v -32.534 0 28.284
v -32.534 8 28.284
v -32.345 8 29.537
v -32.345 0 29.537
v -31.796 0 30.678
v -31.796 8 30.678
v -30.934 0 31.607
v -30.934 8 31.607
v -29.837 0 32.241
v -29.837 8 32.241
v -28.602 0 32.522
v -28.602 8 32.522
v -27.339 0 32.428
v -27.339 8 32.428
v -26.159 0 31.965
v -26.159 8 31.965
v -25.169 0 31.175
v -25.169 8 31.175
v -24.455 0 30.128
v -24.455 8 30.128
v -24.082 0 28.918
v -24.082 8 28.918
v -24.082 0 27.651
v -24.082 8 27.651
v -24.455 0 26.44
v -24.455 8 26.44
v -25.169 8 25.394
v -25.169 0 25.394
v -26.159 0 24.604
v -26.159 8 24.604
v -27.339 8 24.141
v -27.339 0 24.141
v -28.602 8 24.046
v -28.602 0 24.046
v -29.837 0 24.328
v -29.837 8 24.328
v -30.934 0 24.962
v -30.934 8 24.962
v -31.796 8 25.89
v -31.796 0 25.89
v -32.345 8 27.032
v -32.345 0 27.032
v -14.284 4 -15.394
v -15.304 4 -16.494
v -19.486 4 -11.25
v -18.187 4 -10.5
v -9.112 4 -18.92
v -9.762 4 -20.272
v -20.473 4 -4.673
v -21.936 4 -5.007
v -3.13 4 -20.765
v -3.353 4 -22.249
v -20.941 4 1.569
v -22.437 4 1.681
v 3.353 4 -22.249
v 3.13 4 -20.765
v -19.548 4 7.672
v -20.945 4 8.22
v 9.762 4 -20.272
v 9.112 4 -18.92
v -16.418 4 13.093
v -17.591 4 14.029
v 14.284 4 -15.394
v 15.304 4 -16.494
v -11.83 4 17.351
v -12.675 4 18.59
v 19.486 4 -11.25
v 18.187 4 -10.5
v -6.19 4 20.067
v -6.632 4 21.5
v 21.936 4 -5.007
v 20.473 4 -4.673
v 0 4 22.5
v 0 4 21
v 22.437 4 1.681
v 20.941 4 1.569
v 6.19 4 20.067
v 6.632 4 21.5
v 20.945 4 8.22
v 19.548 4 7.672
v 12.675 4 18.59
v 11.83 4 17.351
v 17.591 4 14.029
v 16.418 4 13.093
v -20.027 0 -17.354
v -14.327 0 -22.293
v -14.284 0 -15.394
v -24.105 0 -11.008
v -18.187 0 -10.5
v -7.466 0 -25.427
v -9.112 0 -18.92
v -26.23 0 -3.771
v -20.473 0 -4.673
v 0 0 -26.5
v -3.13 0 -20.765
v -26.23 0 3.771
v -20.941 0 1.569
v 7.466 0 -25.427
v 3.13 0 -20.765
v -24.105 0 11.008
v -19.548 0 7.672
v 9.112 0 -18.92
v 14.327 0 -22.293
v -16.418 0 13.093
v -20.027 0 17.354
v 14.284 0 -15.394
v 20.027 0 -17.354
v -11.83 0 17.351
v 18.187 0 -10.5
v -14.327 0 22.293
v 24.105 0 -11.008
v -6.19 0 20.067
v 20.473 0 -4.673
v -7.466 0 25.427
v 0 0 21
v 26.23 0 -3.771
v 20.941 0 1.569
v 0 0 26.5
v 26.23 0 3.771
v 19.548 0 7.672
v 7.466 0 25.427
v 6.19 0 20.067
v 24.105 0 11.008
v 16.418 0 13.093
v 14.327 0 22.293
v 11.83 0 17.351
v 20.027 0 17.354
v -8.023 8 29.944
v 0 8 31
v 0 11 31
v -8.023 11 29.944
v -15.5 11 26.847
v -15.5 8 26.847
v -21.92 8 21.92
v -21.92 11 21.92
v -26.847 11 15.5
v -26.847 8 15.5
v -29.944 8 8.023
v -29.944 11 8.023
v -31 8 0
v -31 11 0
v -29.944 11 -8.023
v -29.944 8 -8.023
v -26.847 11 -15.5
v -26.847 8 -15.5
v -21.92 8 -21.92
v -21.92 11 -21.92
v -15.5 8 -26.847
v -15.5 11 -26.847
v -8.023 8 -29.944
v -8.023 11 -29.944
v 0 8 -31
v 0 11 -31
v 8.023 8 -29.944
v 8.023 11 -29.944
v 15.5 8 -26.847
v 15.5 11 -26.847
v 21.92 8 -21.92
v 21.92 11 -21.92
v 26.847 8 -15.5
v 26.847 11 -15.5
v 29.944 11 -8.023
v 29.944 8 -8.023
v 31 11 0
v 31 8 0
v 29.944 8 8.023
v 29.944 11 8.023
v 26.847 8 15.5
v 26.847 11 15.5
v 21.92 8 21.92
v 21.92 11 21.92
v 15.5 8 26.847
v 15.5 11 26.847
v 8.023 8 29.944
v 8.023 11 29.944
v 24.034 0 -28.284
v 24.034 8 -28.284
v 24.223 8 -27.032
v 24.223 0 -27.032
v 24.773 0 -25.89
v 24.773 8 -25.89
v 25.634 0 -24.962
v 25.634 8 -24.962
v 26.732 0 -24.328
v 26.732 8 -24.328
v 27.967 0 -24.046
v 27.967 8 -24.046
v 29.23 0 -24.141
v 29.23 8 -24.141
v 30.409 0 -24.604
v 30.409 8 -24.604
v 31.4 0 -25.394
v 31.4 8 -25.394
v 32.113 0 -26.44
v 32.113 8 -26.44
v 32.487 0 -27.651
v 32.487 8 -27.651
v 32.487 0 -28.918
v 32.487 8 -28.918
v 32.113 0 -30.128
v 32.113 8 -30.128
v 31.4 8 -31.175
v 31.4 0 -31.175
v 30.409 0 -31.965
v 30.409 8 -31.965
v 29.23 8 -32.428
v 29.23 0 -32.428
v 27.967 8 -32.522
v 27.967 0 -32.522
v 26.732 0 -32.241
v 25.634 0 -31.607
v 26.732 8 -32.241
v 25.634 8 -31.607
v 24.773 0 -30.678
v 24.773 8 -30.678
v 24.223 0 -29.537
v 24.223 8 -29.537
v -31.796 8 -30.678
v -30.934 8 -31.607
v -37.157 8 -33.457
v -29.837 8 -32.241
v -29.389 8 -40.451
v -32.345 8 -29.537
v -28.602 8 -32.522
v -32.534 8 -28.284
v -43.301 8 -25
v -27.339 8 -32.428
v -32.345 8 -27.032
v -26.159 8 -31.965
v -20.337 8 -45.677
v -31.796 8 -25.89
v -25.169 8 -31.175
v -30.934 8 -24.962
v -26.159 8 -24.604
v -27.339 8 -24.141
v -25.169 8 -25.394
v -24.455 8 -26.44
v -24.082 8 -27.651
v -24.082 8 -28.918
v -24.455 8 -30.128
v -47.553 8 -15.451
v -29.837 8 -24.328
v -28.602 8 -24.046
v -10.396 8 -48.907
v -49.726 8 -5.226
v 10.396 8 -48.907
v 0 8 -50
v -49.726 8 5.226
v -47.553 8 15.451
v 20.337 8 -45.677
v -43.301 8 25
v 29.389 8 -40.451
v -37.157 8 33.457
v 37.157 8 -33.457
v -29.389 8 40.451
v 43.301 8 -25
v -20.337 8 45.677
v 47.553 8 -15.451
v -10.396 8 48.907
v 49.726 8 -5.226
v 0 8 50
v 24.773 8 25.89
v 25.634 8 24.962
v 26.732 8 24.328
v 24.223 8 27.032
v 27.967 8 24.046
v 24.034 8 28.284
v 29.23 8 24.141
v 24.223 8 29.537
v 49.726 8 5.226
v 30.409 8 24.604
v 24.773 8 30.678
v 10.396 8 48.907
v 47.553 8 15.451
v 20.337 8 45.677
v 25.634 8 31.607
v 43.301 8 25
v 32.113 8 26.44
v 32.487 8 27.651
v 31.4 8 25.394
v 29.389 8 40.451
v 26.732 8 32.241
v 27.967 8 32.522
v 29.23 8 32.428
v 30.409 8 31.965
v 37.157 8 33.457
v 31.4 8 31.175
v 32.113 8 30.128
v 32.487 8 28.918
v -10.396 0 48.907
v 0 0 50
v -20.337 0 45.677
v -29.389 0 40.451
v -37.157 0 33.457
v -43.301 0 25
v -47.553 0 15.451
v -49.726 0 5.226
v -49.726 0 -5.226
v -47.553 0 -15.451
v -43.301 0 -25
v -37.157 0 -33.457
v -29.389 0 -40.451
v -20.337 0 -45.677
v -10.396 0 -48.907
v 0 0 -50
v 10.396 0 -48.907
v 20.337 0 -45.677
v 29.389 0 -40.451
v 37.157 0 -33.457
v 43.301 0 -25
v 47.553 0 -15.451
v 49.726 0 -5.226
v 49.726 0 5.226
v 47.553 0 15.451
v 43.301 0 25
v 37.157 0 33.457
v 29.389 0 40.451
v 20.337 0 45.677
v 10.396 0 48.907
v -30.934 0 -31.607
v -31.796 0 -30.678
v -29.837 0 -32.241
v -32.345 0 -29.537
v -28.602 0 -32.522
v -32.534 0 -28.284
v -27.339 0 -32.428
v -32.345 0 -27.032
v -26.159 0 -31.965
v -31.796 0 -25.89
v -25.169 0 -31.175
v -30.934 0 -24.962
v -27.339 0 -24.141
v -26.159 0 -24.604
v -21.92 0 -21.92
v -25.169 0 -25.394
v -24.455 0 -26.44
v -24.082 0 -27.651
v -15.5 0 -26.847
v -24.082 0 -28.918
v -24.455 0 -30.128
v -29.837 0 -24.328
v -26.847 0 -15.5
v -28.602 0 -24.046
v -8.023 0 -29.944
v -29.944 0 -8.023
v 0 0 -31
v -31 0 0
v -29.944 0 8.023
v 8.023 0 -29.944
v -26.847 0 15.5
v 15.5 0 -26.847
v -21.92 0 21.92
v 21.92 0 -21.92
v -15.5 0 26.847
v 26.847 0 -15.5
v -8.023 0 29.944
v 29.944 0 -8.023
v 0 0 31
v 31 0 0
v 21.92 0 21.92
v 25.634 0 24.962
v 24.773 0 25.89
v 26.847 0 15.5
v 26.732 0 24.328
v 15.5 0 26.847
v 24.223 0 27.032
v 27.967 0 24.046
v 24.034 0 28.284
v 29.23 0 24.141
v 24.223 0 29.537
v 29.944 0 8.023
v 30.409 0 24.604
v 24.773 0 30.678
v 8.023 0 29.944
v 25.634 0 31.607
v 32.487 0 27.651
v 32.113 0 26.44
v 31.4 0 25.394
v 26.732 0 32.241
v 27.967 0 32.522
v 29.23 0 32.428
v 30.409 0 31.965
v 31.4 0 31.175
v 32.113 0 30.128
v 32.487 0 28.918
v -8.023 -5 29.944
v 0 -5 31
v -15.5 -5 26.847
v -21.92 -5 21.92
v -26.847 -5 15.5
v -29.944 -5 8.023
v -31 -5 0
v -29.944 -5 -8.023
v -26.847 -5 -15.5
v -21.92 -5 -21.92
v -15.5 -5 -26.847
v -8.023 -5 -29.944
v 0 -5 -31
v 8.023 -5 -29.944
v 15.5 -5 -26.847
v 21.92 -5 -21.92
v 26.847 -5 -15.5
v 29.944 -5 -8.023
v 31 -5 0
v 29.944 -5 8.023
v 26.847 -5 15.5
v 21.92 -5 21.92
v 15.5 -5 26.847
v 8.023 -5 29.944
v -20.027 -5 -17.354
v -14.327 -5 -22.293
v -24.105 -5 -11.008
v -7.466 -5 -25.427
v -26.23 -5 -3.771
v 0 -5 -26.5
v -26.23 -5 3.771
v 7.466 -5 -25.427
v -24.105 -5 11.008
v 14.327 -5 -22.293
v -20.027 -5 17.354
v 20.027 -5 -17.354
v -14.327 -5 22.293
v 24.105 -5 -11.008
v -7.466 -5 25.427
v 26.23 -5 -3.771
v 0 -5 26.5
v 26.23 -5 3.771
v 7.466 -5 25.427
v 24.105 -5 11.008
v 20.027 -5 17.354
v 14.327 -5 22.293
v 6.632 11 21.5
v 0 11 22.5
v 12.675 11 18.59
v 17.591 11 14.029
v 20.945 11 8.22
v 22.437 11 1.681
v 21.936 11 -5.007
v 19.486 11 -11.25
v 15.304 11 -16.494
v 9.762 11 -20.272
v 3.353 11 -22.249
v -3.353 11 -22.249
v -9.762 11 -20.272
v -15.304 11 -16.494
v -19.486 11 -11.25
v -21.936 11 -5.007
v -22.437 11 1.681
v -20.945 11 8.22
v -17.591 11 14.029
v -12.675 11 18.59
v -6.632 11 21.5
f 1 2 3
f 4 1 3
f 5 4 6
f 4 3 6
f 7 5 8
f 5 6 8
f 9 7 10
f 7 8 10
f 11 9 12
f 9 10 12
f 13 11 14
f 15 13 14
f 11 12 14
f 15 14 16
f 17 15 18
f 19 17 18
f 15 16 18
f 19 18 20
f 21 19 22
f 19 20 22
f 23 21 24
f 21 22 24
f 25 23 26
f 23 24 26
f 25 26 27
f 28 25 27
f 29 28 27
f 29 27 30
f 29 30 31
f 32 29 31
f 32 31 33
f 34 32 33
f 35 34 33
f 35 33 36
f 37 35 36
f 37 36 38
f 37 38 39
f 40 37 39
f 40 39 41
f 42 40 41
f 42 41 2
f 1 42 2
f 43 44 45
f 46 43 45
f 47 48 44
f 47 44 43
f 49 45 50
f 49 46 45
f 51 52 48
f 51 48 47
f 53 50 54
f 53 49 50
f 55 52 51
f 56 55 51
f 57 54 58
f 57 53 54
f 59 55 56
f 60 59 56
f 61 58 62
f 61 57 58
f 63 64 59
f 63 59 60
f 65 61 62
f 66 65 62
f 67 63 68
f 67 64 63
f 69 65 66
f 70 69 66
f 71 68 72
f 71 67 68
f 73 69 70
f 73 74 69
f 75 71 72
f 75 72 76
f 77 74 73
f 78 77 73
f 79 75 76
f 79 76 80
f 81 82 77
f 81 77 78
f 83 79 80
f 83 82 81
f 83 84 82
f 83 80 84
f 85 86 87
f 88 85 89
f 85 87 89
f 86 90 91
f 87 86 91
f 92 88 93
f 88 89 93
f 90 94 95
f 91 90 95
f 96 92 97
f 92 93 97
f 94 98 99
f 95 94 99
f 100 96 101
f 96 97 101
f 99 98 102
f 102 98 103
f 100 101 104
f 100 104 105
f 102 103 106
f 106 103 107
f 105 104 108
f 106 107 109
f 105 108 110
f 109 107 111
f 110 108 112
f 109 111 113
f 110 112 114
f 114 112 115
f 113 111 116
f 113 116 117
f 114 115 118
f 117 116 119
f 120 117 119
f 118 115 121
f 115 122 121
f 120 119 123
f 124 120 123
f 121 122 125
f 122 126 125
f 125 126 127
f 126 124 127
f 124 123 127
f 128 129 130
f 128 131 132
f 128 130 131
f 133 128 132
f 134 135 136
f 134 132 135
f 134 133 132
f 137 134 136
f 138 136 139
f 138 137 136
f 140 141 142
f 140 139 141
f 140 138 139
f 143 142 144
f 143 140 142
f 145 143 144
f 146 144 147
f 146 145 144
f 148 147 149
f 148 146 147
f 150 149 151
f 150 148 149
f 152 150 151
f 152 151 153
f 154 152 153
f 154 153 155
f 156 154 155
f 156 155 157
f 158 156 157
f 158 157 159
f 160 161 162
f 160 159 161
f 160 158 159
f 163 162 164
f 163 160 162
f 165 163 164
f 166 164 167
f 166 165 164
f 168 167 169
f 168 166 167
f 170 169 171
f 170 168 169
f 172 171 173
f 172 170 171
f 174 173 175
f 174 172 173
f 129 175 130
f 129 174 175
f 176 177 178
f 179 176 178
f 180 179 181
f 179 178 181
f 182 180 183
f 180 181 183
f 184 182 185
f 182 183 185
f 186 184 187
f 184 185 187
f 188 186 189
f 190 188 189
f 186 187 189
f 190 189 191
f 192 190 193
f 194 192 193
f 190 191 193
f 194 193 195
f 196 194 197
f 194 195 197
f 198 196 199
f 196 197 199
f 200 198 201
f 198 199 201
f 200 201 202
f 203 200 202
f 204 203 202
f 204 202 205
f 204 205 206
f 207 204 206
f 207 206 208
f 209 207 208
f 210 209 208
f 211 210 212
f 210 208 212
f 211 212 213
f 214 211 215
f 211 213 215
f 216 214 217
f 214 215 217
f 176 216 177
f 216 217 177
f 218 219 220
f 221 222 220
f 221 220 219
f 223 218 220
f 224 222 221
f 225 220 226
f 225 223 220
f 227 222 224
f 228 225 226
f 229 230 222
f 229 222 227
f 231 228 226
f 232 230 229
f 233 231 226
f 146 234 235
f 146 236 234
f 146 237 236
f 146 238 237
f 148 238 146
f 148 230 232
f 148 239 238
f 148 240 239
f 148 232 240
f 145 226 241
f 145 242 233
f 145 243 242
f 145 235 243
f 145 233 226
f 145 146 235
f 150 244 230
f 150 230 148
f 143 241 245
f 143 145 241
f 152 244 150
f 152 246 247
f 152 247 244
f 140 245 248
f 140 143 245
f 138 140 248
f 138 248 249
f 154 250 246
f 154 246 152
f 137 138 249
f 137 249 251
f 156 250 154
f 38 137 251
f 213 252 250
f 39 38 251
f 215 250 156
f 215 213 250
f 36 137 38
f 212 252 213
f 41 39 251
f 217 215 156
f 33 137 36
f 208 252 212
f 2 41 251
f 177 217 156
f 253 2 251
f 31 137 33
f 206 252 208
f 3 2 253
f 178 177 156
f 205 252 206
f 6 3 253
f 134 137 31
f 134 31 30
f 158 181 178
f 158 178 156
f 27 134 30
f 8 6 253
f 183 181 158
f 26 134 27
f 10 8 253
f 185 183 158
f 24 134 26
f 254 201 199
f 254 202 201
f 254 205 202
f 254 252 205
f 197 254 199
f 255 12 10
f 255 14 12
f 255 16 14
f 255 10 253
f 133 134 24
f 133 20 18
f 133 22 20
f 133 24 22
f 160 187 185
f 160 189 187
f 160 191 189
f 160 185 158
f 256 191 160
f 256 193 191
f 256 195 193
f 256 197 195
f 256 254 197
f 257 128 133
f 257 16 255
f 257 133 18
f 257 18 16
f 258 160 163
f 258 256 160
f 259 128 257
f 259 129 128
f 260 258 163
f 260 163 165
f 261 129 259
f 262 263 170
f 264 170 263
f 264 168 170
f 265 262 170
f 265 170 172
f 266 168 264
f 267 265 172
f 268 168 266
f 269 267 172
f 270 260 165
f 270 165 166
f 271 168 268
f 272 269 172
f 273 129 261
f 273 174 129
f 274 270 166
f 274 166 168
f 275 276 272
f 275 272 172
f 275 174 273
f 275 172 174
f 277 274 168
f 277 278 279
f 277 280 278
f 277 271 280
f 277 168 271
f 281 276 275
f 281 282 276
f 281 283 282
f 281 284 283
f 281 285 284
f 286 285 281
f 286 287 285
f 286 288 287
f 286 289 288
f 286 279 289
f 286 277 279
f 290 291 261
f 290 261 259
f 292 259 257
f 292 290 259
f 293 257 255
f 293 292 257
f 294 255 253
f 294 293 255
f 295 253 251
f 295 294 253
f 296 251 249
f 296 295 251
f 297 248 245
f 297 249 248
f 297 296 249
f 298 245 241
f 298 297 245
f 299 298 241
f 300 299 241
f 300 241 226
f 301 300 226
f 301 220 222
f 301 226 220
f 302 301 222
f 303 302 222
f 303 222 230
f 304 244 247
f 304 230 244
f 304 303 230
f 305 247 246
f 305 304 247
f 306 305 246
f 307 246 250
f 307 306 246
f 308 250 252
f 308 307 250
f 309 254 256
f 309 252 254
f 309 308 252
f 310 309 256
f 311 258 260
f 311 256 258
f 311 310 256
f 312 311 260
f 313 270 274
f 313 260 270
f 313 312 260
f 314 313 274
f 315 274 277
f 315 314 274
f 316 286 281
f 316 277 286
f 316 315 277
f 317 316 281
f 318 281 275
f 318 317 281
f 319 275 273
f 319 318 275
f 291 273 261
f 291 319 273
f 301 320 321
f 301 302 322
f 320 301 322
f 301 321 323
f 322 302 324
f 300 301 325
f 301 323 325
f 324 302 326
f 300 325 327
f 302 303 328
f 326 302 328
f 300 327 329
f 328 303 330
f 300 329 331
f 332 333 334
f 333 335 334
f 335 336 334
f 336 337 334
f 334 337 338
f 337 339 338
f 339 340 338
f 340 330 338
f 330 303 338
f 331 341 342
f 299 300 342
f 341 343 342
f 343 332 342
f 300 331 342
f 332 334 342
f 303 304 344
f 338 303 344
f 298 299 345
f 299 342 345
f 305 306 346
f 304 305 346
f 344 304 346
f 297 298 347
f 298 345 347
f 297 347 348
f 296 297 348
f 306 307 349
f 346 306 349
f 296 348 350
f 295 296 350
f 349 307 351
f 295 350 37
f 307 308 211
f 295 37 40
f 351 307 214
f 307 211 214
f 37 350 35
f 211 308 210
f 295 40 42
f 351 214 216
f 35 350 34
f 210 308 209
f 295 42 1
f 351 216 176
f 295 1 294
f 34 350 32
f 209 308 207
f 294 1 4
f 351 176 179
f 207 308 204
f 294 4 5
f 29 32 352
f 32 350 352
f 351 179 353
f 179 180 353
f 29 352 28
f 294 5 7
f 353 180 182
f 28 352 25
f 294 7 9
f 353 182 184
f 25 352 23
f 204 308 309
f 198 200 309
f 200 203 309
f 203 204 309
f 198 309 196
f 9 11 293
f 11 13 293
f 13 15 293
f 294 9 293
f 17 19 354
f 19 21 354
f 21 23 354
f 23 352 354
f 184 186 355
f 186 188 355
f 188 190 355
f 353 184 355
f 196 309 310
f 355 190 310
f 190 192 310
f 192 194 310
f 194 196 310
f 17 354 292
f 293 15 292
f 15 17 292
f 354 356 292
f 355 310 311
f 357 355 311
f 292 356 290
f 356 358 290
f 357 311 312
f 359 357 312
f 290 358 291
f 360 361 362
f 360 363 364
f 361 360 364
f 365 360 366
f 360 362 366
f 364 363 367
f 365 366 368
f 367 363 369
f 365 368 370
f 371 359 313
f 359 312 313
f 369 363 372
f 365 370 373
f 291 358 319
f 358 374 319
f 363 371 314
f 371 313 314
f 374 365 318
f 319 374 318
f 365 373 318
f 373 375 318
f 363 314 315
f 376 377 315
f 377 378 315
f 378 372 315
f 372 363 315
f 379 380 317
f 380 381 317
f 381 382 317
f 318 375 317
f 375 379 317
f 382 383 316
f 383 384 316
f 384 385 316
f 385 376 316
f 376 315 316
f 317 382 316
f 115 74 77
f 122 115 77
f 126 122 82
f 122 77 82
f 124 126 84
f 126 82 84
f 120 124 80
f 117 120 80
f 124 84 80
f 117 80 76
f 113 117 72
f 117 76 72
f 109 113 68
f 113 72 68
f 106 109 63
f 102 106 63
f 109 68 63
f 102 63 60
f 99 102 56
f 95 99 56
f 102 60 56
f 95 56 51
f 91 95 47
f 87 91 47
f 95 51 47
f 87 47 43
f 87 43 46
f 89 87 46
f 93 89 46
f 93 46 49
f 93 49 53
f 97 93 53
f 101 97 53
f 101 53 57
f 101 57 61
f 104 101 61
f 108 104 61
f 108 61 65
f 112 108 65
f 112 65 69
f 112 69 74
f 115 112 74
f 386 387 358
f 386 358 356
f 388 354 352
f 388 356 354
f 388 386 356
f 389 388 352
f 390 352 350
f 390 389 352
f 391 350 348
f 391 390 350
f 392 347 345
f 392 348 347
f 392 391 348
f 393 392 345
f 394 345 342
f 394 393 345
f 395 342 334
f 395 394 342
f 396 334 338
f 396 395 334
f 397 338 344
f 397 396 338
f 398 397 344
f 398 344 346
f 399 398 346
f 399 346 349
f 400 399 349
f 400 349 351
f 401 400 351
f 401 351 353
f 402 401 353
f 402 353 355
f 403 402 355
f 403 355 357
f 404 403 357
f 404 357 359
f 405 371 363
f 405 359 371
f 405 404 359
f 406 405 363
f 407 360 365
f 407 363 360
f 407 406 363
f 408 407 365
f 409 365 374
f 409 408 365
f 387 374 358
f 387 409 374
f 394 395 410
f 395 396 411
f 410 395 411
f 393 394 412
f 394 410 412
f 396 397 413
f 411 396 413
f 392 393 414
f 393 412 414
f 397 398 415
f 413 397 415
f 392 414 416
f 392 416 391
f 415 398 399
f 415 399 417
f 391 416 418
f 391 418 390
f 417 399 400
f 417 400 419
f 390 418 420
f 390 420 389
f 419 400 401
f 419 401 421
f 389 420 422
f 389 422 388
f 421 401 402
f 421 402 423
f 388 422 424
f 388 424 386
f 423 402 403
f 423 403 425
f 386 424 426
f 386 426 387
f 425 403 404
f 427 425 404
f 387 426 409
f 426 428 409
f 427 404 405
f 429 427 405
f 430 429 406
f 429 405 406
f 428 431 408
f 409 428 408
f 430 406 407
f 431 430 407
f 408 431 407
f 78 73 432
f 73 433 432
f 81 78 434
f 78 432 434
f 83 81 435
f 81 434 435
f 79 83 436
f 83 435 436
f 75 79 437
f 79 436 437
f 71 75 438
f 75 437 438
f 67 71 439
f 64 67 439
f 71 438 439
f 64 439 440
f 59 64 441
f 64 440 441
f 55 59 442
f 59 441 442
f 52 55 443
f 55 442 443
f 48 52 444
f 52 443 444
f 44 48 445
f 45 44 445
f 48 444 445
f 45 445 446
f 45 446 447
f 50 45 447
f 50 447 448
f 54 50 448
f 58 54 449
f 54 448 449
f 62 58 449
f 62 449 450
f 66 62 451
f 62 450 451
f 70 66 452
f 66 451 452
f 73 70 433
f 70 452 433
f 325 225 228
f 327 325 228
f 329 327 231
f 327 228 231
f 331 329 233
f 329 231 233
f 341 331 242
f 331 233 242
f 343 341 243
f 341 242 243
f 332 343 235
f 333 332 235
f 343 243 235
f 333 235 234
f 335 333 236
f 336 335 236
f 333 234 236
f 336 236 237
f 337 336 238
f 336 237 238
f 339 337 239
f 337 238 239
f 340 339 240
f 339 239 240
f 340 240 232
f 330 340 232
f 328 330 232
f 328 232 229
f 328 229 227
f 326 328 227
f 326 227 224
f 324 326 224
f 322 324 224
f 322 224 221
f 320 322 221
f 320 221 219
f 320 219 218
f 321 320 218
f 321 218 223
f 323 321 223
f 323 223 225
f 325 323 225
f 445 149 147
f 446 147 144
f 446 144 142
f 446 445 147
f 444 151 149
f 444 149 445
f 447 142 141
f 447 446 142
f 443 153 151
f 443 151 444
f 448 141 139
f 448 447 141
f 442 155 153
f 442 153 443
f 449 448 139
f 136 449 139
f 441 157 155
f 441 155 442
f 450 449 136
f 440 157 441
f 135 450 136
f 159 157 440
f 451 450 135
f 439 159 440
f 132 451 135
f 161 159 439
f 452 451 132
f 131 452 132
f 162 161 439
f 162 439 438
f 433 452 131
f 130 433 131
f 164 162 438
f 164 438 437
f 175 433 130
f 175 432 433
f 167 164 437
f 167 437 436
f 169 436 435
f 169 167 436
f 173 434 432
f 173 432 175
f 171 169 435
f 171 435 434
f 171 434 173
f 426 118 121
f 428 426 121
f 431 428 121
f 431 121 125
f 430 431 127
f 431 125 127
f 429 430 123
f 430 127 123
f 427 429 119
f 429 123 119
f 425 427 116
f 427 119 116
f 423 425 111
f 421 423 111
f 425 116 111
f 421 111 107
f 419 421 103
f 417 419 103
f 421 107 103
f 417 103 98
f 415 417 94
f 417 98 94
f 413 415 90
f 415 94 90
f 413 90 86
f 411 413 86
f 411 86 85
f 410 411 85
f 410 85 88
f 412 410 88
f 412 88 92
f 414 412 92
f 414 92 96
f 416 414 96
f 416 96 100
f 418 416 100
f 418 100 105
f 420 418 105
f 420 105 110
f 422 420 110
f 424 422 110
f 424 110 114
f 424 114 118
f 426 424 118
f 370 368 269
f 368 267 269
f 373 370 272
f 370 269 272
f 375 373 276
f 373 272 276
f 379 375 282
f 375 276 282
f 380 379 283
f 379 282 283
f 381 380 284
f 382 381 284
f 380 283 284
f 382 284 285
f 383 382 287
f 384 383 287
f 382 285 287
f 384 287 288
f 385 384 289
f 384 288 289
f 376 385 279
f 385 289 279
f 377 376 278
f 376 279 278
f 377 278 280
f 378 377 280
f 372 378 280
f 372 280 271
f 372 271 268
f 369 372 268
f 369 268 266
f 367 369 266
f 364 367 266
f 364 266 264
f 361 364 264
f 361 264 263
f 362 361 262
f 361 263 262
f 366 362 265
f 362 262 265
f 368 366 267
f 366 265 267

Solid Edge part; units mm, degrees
sketch "Sketch1" plane through (0, 0, 0) normal (1, 0, 0) x (0, 1, 0)
  line L0 (0, 50) -> (0, 31)
  line L1 (0, 31) -> (-5, 31)
  line L2 (-5, 31) -> (-5, 26.5)
  line L3 (-5, 26.5) -> (0, 26.5)
  line L4 (0, 26.5) -> (0, 21)
  line L5 (0, 21) -> (4, 21)
  line L6 (4, 21) -> (4, 22.5)
  line L7 (4, 22.5) -> (11, 22.5)
  line L8 (11, 22.5) -> (11, 31)
  line L9 (11, 31) -> (8, 31)
  line L10 (8, 32.5) -> (8, 31)
  line L11 (8, 39) -> (8, 32.5)
  line L12 (8, 39) -> (8, 50)
  line L13 (8, 50) -> (0, 50)
revolve "RevolvedProtrusion1" add sketch "Sketch1" angle 360 about axis through (0, -22.1591, 0) along (0, 1, 0)
sketch "Sketch2" plane through (0, 8, 0) normal (0, 1, 0) x (-1, 0, 0)
  circle A0 centre (-28.2843, -28.2843) radius 4.25
  circle A1 centre (-28.2843, 28.2843) radius 4.25
  circle A2 centre (28.2843, 28.2843) radius 4.25
  circle A3 centre (28.2843, -28.2843) radius 4.25
extrude "Cutout1" cut sketch "Sketch2" against normal blind 16.0733
